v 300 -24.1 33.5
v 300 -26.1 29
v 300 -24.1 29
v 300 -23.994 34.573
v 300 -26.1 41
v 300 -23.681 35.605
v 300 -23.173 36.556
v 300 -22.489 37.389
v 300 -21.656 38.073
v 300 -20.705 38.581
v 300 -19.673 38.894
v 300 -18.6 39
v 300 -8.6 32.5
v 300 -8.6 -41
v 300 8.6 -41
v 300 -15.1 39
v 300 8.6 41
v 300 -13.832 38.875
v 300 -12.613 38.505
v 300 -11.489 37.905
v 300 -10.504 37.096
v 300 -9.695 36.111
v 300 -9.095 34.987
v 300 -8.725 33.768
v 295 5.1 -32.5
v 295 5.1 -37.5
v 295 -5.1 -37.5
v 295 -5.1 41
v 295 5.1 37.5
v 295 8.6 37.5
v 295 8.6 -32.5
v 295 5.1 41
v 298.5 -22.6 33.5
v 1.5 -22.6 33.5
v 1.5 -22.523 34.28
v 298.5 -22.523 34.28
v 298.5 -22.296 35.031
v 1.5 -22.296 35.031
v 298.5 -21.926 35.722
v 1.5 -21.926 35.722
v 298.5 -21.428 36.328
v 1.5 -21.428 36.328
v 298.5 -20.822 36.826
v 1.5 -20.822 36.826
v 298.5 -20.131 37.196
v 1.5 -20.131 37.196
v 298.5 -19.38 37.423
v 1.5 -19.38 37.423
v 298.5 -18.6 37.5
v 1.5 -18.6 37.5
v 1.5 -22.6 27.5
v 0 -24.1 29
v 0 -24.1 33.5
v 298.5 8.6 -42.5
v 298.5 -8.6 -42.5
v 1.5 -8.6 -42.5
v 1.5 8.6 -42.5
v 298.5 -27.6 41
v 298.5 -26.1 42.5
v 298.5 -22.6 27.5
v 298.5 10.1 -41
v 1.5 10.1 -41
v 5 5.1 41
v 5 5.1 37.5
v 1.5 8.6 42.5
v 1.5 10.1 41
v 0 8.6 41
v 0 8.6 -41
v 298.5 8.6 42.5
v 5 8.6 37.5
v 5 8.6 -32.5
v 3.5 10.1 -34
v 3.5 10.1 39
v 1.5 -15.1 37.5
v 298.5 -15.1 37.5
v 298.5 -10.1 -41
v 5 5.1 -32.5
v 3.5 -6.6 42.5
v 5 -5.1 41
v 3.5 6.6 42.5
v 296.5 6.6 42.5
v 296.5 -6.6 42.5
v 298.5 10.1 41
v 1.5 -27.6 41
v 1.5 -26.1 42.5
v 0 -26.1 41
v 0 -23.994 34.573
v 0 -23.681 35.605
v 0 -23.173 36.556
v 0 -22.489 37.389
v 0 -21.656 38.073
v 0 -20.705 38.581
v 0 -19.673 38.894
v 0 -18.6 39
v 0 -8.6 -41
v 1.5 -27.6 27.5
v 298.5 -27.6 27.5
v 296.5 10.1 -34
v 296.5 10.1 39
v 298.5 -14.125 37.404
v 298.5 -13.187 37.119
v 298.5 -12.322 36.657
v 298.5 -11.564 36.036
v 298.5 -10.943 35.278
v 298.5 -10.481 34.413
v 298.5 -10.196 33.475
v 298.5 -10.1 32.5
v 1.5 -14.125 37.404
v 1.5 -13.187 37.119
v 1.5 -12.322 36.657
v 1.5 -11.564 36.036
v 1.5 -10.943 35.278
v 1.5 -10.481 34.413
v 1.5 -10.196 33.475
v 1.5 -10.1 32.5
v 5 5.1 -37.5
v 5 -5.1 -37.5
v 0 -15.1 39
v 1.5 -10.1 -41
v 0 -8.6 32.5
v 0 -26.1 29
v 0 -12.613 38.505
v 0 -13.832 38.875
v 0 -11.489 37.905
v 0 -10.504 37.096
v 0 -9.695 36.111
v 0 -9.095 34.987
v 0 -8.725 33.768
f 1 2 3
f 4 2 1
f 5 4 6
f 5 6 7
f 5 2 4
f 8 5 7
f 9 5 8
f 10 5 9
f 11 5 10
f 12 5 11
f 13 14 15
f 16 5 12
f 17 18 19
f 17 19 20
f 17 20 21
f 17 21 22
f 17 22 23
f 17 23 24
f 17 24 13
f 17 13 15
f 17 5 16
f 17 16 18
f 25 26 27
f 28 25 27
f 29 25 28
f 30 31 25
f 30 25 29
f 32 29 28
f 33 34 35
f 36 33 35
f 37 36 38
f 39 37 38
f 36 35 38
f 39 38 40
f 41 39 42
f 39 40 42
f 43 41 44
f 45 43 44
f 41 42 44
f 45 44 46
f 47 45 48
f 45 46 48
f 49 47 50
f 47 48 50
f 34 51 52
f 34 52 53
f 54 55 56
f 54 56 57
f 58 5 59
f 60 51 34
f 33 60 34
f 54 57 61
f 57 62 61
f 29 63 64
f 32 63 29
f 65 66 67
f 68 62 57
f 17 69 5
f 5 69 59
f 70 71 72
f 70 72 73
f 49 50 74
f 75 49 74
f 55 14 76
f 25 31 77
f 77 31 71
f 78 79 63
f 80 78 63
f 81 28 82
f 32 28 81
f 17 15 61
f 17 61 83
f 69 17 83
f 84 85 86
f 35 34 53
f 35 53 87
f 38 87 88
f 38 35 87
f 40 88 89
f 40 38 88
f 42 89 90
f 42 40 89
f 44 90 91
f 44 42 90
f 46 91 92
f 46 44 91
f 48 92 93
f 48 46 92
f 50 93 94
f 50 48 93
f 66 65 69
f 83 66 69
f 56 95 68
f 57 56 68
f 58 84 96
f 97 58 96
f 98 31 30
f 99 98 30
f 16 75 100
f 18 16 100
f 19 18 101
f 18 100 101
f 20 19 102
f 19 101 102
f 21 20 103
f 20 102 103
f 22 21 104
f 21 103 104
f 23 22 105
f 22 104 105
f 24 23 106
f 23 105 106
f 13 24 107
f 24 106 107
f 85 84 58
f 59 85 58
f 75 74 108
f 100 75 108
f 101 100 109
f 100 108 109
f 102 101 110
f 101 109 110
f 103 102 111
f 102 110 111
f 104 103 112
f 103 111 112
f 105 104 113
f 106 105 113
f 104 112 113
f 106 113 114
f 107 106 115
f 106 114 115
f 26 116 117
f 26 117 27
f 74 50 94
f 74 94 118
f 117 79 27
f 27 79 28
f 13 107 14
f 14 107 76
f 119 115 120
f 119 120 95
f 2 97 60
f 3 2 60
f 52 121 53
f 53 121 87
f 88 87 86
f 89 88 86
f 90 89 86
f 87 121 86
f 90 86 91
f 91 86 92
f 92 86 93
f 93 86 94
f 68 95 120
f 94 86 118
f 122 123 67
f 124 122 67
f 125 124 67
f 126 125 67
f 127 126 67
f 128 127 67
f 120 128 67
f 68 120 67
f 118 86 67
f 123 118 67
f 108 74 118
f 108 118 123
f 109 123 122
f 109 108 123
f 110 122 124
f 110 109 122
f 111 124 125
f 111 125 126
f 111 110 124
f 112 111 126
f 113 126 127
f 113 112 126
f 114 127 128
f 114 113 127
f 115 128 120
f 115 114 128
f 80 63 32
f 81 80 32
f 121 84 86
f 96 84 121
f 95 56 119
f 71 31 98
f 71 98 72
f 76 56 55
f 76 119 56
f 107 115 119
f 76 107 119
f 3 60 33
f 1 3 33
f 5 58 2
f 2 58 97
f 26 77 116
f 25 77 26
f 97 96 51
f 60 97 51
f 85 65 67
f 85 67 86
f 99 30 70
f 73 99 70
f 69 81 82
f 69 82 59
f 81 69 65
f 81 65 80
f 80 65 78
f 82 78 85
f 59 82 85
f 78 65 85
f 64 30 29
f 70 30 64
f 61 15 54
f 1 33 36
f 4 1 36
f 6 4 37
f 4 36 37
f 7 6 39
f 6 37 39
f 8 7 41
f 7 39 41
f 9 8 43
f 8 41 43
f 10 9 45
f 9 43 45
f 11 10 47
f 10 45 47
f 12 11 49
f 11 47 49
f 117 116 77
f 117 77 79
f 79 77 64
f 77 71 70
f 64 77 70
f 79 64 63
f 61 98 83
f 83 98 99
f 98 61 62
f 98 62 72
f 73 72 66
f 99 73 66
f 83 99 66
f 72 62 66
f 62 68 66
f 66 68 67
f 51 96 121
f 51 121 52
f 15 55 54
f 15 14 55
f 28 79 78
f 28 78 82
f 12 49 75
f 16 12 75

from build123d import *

# Parameters (mm, degrees)
F0_W     = 10.2
F0_H     = 75
F1_DEPTH = 300
F2_W     = 290
F2_H     = 70
F3_DEPTH = 5
F4_W     = 290
F4_H     = 10.2
F5_DEPTH = 80
F6_SIZE  = 1.5


# Not quite as in the source:
# - a feature names something its author has since deleted; it is built from what else it names


with BuildPart() as f1:
    # F0 (on Right) → F1 (new body)
    with BuildSketch(Plane.YZ):
        Polygon((-10.1, -42.5), (10.1, -42.5), (10.1, 42.5), (-27.6, 42.5), (-27.6, 27.5), (-22.6, 27.5), (-22.6, 33.5), (-22.6, 37.5), (-18.6, 37.5), (-15.1, 37.5), (-10.1, 37.5), (-10.1, 32.5), align=None)
        Rectangle(F0_W, F0_H, mode=Mode.SUBTRACT)
        with BuildLine():
            ThreePointArc((-22.6, 33.5), (-21.4284271247, 36.3284271247), (-18.6, 37.5))
            Line((-18.6, 37.5), (-22.6, 37.5))
            Line((-22.6, 37.5), (-22.6, 33.5))
        make_face()
        with BuildLine():
            ThreePointArc((-15.1, 37.5), (-11.5644660941, 36.0355339059), (-10.1, 32.5))
            Line((-10.1, 32.5), (-10.1, 37.5))
            Line((-10.1, 37.5), (-15.1, 37.5))
        make_face()
        Rectangle(F0_W, F0_H)
    extrude(amount=F1_DEPTH)

    # F2 (on face) → F3 (cut)
    with BuildSketch(Plane(origin=(0, 10.1, 0), x_dir=(-1, 0, 0), z_dir=(0, 1, 0))):
        with Locations((-150, 2.5)):
            Rectangle(F2_W, F2_H)
    extrude(amount=-F3_DEPTH, mode=Mode.SUBTRACT)

    # F4 (on face) → F5 (cut)
    with BuildSketch(Plane.XY.offset(42.5)):
        with Locations((150, 0)):
            Rectangle(F4_W, F4_H)
    extrude(amount=-F5_DEPTH, mode=Mode.SUBTRACT)

    # F6
    f6_edges = [f1.edges().sort_by_distance(p)[0] for p in [
        (300, 0, -42.5),
        (300, 10.1, 0),
        (300, -8.75, 42.5),
        (300, -27.6, 35),
        (300, -25.1, 27.5),
        (300, -22.6, 30.5),
        (300, -21.428427, 36.328427),
        (300, -16.85, 37.5),
        (300, -11.564466, 36.035534),
        (300, -10.1, -5),
        (150, 10.1, -42.5),
        (0, 10.1, 0),
        (150, 10.1, 42.5),
        (5, 10.1, 2.5),
        (150, 10.1, -32.5),
        (295, 10.1, 2.5),
        (150, 10.1, 37.5),
        (0, -8.75, 42.5),
        (150, -27.6, 42.5),
        (150, -5.1, 42.5),
        (5, 0, 42.5),
        (150, 5.1, 42.5),
        (295, 0, 42.5),
        (150, -10.1, -42.5),
        (0, 0, -42.5),
        (0, -27.6, 35),
        (0, -25.1, 27.5),
        (0, -22.6, 30.5),
        (0, -21.428427, 36.328427),
        (0, -16.85, 37.5),
        (0, -11.564466, 36.035534),
        (0, -10.1, -5),
    ]]
    chamfer(f6_edges, length=F6_SIZE)


solid = f1.part
